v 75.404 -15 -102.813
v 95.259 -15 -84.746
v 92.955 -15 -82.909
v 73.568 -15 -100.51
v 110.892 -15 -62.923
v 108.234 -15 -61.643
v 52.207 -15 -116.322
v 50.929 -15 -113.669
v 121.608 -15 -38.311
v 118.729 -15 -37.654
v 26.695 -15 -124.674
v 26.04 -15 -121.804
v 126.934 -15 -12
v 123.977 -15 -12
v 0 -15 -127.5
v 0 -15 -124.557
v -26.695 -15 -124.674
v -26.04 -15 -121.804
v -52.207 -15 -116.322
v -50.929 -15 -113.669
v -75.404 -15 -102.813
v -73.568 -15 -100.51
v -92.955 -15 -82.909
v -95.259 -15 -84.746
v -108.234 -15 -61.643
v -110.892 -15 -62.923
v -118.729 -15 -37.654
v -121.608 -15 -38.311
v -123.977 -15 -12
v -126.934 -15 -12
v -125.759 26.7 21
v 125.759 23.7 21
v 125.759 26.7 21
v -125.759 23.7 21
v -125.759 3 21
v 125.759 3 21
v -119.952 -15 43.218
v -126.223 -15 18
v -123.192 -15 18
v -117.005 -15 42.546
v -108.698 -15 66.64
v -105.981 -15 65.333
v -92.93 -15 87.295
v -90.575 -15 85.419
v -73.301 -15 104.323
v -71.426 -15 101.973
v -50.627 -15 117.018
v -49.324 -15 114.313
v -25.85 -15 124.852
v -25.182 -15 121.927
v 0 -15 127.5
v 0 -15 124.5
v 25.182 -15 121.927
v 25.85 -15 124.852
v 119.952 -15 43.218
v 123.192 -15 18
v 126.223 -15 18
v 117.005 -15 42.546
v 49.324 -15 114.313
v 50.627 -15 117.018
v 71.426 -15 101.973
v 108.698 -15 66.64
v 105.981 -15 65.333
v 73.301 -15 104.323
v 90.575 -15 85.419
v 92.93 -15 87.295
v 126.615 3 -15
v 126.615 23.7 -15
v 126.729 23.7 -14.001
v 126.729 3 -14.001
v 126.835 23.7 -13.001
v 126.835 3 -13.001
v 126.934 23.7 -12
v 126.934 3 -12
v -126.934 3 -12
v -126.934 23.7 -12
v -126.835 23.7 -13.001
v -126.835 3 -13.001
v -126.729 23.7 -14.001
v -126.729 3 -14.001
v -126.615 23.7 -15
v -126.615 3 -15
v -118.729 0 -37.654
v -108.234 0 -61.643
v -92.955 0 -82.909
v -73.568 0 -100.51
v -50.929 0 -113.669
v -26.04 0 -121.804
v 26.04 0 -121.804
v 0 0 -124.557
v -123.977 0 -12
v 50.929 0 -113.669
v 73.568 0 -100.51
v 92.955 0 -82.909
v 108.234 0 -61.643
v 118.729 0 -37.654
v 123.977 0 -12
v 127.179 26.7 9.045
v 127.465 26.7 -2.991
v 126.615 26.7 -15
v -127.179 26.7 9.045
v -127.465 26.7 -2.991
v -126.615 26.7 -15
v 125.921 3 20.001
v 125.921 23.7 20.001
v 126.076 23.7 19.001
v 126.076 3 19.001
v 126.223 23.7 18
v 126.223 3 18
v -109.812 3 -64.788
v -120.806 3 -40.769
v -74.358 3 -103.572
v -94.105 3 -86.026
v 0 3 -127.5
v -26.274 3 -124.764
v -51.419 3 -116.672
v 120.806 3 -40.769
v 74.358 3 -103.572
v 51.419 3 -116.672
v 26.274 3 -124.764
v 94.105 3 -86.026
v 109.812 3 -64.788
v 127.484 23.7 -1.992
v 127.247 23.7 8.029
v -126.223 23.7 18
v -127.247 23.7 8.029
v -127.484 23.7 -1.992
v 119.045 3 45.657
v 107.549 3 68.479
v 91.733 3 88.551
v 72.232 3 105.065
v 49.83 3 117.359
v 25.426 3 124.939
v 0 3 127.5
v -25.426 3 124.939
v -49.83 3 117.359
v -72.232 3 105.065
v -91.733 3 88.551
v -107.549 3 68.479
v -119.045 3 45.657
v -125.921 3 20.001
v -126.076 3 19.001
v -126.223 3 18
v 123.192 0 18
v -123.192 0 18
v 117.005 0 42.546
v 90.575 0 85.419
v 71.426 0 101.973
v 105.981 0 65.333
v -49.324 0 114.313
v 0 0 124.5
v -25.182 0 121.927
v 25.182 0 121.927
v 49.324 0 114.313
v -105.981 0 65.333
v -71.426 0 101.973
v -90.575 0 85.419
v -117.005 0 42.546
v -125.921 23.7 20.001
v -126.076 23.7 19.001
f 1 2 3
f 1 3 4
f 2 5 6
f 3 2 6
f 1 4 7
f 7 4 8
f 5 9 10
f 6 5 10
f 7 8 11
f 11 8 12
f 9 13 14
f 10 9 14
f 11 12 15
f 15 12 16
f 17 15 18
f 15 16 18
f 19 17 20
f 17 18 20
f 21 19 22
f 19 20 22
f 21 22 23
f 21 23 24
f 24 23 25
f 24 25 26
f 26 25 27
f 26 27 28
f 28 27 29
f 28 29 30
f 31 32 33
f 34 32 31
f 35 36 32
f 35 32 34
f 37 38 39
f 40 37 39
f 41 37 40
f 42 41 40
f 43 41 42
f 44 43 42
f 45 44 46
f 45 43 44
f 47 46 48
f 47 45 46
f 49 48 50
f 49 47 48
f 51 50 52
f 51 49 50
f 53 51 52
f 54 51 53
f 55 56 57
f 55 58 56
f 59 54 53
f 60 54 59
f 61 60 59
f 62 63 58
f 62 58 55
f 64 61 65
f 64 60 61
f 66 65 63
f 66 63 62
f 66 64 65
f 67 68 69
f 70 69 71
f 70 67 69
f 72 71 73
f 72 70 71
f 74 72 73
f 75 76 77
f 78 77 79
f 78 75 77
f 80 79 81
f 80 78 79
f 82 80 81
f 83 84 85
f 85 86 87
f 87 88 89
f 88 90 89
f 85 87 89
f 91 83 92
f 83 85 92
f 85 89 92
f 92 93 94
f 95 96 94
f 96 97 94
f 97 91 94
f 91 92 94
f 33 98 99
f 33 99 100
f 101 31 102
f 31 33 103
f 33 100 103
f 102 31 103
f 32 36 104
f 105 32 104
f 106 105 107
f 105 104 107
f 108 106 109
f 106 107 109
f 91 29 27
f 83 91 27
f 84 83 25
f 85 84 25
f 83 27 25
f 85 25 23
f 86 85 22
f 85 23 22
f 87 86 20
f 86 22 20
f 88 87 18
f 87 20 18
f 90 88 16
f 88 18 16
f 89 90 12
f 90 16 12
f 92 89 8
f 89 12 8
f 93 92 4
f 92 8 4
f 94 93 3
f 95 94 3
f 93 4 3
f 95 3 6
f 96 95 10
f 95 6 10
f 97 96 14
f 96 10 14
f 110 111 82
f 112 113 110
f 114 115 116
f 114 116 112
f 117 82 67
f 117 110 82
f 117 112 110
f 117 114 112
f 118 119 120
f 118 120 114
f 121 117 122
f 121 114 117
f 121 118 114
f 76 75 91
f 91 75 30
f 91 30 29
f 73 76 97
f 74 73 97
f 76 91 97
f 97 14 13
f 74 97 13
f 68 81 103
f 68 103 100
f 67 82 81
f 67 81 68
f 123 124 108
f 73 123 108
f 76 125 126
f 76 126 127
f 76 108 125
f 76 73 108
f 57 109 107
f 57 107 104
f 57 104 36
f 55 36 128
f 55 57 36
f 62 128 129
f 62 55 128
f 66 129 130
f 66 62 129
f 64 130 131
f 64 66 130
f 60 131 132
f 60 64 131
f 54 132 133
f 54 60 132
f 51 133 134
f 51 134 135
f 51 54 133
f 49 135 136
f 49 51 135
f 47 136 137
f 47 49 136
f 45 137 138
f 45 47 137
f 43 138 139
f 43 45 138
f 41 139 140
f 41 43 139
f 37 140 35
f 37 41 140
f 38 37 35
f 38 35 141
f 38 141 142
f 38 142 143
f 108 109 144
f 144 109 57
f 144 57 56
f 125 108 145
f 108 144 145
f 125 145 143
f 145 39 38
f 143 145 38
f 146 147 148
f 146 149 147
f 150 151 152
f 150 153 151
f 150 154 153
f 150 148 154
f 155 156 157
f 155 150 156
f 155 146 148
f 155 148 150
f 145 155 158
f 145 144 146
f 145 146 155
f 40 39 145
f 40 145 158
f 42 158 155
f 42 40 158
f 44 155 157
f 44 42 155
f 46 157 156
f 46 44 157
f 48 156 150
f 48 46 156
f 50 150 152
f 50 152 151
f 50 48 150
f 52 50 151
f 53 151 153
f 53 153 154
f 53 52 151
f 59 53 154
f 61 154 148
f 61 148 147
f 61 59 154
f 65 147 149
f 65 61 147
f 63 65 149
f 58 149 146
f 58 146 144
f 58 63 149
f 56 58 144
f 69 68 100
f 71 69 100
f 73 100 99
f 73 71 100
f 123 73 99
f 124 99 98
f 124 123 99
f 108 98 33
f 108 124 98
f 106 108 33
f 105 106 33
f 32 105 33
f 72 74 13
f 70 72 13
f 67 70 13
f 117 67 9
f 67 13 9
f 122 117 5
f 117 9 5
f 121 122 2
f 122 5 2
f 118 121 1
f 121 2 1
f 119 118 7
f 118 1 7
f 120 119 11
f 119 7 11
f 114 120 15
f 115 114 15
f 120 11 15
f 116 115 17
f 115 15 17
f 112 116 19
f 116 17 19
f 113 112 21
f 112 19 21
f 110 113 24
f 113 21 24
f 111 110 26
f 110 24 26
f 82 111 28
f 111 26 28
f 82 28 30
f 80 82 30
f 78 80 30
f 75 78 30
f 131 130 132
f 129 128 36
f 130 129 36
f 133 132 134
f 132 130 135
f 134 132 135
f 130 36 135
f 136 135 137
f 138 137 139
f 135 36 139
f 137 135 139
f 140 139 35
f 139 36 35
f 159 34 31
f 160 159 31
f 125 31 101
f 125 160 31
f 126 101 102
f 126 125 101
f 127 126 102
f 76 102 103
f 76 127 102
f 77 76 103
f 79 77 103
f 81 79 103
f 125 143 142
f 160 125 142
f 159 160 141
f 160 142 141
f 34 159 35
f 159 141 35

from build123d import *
from build123d.topology import SkipClean

# Parameters (mm, degrees)
BOSS_EXTRUDE1_DEPTH   = 3
BOSS_EXTRUDE1_2_DEPTH = 3
BOSS_EXTRUDE2_DEPTH   = 20.7
BOSS_EXTRUDE3_DEPTH   = 3
BOSS_EXTRUDE4_START   = 15
BOSS_EXTRUDE4_DEPTH   = 15


with BuildPart() as part:
    # Sketch1 → Boss-Extrude1 (new body)
    with BuildSketch(Plane(origin=(0, 0, 0), x_dir=(1, 0, 0), z_dir=(0, 1, 0))):
        with BuildLine():
            Line((-126.934037988, 12), (126.934037988, 12))
            ThreePointArc((126.934037988, 12), (0, 127.5), (-126.934037988, 12))
        make_face()
    extrude(amount=BOSS_EXTRUDE1_DEPTH)



with BuildPart() as body_2:
    # Sketch1 → Boss-Extrude1 2 (new body)
    with BuildSketch(Plane(origin=(0, 0, 0), x_dir=(1, 0, 0), z_dir=(0, 1, 0))):
        with BuildLine():
            Line((-126.223016918, -18), (126.223016918, -18))
            ThreePointArc((126.223016918, -18), (0, -127.5), (-126.223016918, -18))
        make_face()
    extrude(amount=BOSS_EXTRUDE1_2_DEPTH)


with BuildPart() as part_1:
    with SkipClean():  # the faces are left unmerged after this step: merging them gives an invalid solid
        add(part.part)

        add(body_2.part)  # Boss-Extrude2 merges body 2
        # Sketch5 → Boss-Extrude2 (add)
        with BuildSketch(Plane(origin=(0, 3, 0), x_dir=(1, 0, 0), z_dir=(0, 1, 0))):
            with BuildLine():
                Line((-126.614572621, 15), (126.614572621, 15))
                ThreePointArc((126.614572621, 15), (126.783179032, 13.50094495), (126.934037988, 12))
                Line((126.934037988, 12), (-126.934037988, 12))
                ThreePointArc((-126.934037988, 12), (-126.783179032, 13.50094495), (-126.614572621, 15))
            make_face()
            with BuildLine():
                Line((-125.758697512, -21), (125.758697512, -21))
                ThreePointArc((125.758697512, -21), (125.999786118, -19.501381954), (126.223016918, -18))
                Line((126.223016918, -18), (-126.223016918, -18))
                ThreePointArc((-126.223016918, -18), (-125.999786118, -19.501381954), (-125.758697512, -21))
            make_face()
        extrude(amount=BOSS_EXTRUDE2_DEPTH)

    # Sketch6 → Boss-Extrude3 (add)
    with BuildSketch(Plane(origin=(0, 23.7, 0), x_dir=(1, 0, 0), z_dir=(0, 1, 0))):
        with BuildLine():
            Line((-126.614572621, 15), (126.614572621, 15))
            ThreePointArc((126.614572621, 15), (127.463982636, -3.030368055), (125.758697512, -21))
            Line((125.758697512, -21), (-125.758697512, -21))
            ThreePointArc((-125.758697512, -21), (-127.463982636, -3.030368055), (-126.614572621, 15))
        make_face()
    extrude(amount=BOSS_EXTRUDE3_DEPTH)

    # Sketch7 → Boss-Extrude4 (add)
    with BuildSketch(Plane.XZ.offset(BOSS_EXTRUDE4_START)):
        with BuildLine():
            Line((-126.934037988, -12), (-123.977391141, -12))
            ThreePointArc((-123.977391141, -12), (0, -124.55678831), (123.977391141, -12))
            Line((123.977391141, -12), (126.934037988, -12))
            ThreePointArc((126.934037988, -12), (0, -127.5), (-126.934037988, -12))
        make_face()
        with BuildLine():
            Line((123.191923437, 18), (126.223016918, 18))
            ThreePointArc((126.223016918, 18), (0, 127.5), (-126.223016918, 18))
            Line((-126.223016918, 18), (-123.191923437, 18))
            ThreePointArc((-123.191923437, 18), (0, 124.5), (123.191923437, 18))
        make_face()
    extrude(amount=-BOSS_EXTRUDE4_DEPTH)


solid = part_1.part
